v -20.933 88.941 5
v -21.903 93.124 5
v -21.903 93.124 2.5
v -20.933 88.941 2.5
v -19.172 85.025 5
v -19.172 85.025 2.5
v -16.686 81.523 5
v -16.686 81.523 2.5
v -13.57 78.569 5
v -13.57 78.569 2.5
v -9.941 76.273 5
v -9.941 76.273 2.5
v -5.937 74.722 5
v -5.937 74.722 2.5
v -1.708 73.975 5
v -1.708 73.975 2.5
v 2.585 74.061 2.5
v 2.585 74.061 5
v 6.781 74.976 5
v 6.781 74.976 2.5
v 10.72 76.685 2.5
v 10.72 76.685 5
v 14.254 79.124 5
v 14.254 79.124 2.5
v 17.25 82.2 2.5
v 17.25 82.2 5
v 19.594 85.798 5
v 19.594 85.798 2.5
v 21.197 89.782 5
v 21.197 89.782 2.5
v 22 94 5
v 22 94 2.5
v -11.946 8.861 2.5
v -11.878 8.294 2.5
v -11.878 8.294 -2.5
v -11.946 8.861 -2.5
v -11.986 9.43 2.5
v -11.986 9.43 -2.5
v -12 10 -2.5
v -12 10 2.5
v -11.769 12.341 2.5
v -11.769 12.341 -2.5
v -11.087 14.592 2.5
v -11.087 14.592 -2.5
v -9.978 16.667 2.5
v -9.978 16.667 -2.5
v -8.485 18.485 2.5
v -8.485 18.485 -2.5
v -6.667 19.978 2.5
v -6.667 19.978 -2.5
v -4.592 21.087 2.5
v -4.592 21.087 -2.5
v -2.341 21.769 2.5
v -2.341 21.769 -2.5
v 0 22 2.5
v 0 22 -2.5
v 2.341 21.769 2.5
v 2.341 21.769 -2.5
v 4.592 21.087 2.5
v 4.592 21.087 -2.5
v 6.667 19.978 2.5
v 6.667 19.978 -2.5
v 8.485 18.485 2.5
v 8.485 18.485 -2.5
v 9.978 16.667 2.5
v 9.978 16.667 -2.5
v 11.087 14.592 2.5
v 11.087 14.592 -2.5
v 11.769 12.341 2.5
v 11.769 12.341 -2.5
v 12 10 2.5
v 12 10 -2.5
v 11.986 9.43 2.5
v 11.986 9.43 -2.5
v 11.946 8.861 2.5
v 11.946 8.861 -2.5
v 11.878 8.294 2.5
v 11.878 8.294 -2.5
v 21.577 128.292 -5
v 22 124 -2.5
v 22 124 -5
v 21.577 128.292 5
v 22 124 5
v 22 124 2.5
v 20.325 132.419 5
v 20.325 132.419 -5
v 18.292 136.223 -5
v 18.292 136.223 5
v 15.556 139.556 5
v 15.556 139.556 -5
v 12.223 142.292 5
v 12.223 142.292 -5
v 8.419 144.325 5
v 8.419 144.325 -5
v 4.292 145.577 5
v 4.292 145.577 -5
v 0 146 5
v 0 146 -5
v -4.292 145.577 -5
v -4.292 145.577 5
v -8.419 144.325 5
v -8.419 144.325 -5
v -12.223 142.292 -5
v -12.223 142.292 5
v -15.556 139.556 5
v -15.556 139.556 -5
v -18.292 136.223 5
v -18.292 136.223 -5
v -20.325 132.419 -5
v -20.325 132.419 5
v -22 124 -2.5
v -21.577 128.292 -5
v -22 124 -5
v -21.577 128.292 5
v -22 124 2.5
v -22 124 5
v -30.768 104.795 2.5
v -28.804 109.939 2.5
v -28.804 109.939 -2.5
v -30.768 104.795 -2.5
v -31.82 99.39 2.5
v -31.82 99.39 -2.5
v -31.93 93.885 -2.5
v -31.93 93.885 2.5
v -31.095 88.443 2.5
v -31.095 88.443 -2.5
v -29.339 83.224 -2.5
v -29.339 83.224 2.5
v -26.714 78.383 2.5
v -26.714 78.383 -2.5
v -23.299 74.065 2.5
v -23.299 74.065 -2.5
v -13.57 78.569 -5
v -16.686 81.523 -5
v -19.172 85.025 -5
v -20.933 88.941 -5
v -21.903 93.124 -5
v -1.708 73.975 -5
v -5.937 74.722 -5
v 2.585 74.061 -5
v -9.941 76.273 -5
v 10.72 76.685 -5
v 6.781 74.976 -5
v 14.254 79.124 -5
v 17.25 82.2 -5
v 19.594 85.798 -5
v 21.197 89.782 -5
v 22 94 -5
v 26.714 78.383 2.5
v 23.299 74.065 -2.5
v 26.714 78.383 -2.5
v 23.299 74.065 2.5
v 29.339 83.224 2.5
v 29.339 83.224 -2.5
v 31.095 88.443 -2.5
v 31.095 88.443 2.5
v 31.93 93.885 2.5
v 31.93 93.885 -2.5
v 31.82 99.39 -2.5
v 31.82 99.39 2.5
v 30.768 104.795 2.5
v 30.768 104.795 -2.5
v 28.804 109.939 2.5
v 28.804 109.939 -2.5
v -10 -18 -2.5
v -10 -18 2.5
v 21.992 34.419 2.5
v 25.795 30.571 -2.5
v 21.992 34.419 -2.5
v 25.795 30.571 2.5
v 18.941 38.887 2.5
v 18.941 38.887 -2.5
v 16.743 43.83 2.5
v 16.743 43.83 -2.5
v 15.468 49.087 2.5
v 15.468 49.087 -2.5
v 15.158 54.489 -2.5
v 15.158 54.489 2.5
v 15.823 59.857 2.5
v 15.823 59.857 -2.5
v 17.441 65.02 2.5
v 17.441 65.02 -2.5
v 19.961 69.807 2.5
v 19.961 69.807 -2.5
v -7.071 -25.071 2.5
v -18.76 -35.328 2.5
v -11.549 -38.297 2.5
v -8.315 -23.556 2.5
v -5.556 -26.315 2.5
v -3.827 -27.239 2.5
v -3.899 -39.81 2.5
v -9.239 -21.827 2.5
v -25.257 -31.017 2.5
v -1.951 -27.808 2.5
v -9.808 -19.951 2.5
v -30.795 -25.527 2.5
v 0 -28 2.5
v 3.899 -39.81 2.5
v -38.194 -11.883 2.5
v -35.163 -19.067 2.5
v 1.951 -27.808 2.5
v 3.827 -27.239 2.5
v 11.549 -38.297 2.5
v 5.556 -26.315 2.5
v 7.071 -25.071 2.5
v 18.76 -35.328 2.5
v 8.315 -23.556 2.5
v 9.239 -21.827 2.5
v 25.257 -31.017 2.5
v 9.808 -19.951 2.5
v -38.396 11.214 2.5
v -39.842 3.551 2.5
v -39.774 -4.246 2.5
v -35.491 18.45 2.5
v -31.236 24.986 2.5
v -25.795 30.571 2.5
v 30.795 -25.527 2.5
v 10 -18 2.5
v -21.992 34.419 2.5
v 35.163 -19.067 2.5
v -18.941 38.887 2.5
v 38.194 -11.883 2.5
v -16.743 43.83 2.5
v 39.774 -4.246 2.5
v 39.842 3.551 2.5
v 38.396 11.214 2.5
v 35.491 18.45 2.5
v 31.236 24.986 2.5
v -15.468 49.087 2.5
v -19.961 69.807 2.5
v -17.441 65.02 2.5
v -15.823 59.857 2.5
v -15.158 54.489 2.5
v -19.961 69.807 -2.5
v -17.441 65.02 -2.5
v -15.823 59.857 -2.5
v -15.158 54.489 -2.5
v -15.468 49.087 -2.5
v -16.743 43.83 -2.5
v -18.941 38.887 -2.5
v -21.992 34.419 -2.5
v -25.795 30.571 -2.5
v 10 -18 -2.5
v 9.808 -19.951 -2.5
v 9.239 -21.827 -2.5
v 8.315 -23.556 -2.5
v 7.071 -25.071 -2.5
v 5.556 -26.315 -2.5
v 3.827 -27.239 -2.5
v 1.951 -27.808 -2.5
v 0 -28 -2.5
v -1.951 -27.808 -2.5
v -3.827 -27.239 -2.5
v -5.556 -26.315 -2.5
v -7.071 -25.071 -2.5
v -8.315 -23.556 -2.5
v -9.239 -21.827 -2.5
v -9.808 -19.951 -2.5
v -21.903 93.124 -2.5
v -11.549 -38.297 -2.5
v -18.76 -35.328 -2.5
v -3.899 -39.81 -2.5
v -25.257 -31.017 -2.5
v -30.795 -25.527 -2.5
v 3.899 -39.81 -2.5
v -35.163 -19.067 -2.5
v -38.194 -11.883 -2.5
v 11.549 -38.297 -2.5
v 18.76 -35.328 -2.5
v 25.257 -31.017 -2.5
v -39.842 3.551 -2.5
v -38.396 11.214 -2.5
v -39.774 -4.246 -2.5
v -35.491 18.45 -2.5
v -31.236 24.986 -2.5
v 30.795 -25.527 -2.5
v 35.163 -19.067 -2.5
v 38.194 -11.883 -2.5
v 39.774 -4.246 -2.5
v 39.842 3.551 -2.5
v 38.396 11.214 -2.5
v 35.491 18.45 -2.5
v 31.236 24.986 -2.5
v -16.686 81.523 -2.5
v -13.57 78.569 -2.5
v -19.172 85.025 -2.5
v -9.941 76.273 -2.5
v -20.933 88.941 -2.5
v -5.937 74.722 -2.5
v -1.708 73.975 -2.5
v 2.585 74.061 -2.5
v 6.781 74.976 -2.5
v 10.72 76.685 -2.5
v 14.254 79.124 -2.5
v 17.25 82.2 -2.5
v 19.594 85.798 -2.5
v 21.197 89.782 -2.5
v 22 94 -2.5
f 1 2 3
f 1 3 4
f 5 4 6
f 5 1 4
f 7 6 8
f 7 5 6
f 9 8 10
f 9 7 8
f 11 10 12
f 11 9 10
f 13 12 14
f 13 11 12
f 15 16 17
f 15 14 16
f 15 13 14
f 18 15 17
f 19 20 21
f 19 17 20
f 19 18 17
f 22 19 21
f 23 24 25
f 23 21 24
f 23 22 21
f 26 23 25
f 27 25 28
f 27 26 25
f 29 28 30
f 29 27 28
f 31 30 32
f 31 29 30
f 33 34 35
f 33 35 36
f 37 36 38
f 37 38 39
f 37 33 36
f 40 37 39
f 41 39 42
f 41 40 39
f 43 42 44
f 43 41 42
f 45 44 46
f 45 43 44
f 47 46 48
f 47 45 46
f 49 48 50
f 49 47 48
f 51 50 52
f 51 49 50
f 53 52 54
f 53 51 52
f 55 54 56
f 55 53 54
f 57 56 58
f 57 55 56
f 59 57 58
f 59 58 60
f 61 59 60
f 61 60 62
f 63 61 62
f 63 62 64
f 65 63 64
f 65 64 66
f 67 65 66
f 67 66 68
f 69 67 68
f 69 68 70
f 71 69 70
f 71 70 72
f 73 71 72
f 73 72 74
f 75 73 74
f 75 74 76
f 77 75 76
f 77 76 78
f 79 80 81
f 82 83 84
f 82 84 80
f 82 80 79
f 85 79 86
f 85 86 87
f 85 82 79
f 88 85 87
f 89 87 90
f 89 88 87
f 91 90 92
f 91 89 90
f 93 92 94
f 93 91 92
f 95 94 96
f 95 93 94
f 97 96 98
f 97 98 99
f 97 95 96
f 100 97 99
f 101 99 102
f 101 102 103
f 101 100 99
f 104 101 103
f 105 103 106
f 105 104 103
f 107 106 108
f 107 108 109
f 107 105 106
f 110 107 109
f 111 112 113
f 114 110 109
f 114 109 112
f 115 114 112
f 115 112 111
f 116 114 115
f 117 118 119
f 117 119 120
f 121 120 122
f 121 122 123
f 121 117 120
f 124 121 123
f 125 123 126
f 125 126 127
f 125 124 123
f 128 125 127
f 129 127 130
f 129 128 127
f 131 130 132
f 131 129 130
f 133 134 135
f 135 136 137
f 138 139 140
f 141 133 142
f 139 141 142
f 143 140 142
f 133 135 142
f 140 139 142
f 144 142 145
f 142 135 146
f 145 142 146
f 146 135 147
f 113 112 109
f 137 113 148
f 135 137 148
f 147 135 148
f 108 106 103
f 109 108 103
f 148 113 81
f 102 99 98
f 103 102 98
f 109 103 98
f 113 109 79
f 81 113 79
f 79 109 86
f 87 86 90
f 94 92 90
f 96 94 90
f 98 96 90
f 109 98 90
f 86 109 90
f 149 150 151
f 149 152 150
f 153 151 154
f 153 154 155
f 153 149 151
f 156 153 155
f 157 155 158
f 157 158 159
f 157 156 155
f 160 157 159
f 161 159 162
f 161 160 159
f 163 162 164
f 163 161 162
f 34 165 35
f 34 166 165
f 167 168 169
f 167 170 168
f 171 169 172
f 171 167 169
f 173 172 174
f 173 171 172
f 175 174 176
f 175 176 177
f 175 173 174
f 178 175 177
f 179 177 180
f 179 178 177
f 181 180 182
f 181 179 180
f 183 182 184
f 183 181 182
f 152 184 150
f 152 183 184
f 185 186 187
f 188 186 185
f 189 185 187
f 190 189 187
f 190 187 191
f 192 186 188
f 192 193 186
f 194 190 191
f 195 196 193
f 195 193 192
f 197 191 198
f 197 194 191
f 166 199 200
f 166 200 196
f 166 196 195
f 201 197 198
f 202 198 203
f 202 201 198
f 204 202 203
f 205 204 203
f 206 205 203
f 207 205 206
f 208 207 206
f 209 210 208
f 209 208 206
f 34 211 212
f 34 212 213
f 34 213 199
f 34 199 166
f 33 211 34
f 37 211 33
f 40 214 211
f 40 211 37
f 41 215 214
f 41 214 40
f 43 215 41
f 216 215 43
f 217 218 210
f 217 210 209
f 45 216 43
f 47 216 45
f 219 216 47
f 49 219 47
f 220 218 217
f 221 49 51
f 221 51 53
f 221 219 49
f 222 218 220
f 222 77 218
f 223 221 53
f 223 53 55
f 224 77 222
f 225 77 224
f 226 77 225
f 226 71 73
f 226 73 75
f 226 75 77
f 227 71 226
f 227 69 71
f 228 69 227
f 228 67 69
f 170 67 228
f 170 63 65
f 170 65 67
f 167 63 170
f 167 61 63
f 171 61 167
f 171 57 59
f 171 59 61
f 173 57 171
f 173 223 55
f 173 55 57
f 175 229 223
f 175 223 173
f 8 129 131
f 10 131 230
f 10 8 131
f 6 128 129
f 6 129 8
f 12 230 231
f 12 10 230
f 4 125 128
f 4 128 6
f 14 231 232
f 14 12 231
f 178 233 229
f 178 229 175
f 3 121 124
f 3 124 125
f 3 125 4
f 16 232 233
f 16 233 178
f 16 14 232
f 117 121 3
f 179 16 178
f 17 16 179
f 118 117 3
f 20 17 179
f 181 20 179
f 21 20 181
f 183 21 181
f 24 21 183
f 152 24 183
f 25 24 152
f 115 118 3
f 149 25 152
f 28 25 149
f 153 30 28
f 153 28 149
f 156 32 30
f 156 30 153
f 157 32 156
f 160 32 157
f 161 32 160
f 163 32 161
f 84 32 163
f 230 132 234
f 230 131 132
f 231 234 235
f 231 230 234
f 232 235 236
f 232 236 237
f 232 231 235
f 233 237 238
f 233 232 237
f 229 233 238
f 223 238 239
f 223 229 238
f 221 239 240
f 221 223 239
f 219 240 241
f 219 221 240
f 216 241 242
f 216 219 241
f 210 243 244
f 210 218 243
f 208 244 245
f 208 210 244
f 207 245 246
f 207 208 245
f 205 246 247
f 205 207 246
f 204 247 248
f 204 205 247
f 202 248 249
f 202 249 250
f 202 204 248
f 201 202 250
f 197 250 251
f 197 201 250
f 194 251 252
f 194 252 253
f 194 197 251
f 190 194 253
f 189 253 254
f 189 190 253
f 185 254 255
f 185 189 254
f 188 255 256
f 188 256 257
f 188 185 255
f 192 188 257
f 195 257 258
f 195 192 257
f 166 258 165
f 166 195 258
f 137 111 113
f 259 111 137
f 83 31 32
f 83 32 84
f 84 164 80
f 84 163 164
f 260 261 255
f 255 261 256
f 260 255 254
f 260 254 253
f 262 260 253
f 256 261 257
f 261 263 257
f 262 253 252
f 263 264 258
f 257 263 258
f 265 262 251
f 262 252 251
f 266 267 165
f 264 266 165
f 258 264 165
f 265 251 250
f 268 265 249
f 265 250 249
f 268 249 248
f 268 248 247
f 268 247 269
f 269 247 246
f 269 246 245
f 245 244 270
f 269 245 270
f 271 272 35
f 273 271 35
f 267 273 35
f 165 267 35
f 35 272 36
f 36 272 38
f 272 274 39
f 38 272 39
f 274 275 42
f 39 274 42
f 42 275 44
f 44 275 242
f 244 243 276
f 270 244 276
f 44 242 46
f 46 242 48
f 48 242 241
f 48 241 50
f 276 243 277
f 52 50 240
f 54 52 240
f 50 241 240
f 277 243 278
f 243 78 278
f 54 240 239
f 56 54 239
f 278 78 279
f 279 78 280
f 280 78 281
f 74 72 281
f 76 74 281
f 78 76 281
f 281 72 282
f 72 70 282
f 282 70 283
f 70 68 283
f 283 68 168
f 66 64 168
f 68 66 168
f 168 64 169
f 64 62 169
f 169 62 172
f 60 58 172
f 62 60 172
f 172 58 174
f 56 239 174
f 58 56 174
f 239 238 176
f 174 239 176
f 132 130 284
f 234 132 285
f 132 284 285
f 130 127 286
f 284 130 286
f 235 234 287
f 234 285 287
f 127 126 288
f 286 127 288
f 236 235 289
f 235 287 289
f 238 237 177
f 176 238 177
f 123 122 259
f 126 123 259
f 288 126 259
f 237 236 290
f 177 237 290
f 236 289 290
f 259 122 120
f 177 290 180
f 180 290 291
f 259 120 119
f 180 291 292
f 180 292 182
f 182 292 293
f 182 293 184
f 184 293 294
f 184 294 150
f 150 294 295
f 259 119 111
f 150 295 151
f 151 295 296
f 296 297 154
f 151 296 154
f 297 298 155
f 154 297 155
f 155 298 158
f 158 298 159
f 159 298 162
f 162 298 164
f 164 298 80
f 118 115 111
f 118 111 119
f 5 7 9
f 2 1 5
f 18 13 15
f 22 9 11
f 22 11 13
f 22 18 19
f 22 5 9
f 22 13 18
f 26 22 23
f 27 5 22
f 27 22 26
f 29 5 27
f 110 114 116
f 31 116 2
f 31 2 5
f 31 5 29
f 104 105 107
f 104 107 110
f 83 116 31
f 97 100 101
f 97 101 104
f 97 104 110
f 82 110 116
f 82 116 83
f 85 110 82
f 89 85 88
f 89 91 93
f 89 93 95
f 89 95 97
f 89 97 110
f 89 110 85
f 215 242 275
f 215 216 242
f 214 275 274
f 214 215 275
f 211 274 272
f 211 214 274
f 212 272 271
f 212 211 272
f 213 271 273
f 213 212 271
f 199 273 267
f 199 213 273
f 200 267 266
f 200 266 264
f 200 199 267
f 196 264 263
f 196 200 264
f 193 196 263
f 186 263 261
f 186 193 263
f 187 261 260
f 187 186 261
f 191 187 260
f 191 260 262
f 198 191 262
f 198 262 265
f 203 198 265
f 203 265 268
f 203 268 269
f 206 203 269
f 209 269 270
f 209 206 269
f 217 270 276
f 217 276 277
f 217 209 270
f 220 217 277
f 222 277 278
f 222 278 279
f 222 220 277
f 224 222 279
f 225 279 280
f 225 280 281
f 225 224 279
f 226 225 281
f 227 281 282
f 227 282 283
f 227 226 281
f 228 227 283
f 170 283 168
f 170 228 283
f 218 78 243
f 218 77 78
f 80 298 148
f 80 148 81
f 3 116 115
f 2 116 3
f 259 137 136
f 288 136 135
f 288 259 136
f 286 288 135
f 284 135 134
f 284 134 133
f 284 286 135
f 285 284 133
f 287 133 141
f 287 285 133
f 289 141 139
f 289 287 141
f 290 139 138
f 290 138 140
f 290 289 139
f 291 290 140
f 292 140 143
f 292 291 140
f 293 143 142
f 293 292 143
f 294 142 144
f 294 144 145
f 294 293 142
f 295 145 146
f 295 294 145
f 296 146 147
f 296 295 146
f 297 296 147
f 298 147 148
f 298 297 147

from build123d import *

# Parameters (mm, degrees)
BOSS_EXTRUDE2_DEPTH = 5
BOSS_EXTRUDE4_DEPTH = 2.5


with BuildPart() as part:
    # Sketch1 → Boss-Extrude2 (new, symmetric)
    with BuildSketch(Plane.XY):
        with BuildLine():
            Line((22, 94), (22, 124))
            ThreePointArc((22, 124), (0, 146), (-22, 124))
            Line((-22, 124), (-21.902773493, 93.124497726))
            ThreePointArc((-21.902773493, 93.124497726), (0.440442172, 73.913669144), (22, 94))
        make_face()
    extrude(amount=BOSS_EXTRUDE2_DEPTH, both=True)

    # Sketch1<7> → Boss-Extrude4 (add, symmetric)
    with BuildSketch(Plane.XY):
        with BuildLine():
            Line((28.804390709, 109.9394073), (22, 124))
            Line((22, 124), (22, 94))
            ThreePointArc((22, 94), (0.440442172, 73.913669144), (-21.902773493, 93.124497726))
            Line((-21.902773493, 93.124497726), (-22, 124))
            Line((-22, 124), (-28.804390709, 109.9394073))
            ThreePointArc((-28.804390709, 109.9394073), (-31.629698625, 91.14591256), (-23.298809999, 74.064516129))
            ThreePointArc((-23.298809999, 74.064516129), (-15.190736019, 51.78096855), (-25.79511107, 30.571428571))
            ThreePointArc((-25.79511107, 30.571428571), (0, -40), (25.79511107, 30.571428571))
            ThreePointArc((25.79511107, 30.571428571), (15.190736019, 51.78096855), (23.298809999, 74.064516129))
            ThreePointArc((23.298809999, 74.064516129), (31.629698625, 91.14591256), (28.804390709, 109.9394073))
        make_face()
        with BuildLine():
            ThreePointArc((-11.878172589, 8.294416244), (-11.969504398, 9.1450354), (-12, 10))
            ThreePointArc((-12, 10), (0, 22), (12, 10))
            ThreePointArc((12, 10), (11.969504398, 9.1450354), (11.878172589, 8.294416244))
            Line((11.878172589, 8.294416244), (10, -18))
            ThreePointArc((10, -18), (0, -28), (-10, -18))
            Line((-10, -18), (-11.878172589, 8.294416244))
        make_face(mode=Mode.SUBTRACT)
    extrude(amount=BOSS_EXTRUDE4_DEPTH, both=True)


solid = part.part
